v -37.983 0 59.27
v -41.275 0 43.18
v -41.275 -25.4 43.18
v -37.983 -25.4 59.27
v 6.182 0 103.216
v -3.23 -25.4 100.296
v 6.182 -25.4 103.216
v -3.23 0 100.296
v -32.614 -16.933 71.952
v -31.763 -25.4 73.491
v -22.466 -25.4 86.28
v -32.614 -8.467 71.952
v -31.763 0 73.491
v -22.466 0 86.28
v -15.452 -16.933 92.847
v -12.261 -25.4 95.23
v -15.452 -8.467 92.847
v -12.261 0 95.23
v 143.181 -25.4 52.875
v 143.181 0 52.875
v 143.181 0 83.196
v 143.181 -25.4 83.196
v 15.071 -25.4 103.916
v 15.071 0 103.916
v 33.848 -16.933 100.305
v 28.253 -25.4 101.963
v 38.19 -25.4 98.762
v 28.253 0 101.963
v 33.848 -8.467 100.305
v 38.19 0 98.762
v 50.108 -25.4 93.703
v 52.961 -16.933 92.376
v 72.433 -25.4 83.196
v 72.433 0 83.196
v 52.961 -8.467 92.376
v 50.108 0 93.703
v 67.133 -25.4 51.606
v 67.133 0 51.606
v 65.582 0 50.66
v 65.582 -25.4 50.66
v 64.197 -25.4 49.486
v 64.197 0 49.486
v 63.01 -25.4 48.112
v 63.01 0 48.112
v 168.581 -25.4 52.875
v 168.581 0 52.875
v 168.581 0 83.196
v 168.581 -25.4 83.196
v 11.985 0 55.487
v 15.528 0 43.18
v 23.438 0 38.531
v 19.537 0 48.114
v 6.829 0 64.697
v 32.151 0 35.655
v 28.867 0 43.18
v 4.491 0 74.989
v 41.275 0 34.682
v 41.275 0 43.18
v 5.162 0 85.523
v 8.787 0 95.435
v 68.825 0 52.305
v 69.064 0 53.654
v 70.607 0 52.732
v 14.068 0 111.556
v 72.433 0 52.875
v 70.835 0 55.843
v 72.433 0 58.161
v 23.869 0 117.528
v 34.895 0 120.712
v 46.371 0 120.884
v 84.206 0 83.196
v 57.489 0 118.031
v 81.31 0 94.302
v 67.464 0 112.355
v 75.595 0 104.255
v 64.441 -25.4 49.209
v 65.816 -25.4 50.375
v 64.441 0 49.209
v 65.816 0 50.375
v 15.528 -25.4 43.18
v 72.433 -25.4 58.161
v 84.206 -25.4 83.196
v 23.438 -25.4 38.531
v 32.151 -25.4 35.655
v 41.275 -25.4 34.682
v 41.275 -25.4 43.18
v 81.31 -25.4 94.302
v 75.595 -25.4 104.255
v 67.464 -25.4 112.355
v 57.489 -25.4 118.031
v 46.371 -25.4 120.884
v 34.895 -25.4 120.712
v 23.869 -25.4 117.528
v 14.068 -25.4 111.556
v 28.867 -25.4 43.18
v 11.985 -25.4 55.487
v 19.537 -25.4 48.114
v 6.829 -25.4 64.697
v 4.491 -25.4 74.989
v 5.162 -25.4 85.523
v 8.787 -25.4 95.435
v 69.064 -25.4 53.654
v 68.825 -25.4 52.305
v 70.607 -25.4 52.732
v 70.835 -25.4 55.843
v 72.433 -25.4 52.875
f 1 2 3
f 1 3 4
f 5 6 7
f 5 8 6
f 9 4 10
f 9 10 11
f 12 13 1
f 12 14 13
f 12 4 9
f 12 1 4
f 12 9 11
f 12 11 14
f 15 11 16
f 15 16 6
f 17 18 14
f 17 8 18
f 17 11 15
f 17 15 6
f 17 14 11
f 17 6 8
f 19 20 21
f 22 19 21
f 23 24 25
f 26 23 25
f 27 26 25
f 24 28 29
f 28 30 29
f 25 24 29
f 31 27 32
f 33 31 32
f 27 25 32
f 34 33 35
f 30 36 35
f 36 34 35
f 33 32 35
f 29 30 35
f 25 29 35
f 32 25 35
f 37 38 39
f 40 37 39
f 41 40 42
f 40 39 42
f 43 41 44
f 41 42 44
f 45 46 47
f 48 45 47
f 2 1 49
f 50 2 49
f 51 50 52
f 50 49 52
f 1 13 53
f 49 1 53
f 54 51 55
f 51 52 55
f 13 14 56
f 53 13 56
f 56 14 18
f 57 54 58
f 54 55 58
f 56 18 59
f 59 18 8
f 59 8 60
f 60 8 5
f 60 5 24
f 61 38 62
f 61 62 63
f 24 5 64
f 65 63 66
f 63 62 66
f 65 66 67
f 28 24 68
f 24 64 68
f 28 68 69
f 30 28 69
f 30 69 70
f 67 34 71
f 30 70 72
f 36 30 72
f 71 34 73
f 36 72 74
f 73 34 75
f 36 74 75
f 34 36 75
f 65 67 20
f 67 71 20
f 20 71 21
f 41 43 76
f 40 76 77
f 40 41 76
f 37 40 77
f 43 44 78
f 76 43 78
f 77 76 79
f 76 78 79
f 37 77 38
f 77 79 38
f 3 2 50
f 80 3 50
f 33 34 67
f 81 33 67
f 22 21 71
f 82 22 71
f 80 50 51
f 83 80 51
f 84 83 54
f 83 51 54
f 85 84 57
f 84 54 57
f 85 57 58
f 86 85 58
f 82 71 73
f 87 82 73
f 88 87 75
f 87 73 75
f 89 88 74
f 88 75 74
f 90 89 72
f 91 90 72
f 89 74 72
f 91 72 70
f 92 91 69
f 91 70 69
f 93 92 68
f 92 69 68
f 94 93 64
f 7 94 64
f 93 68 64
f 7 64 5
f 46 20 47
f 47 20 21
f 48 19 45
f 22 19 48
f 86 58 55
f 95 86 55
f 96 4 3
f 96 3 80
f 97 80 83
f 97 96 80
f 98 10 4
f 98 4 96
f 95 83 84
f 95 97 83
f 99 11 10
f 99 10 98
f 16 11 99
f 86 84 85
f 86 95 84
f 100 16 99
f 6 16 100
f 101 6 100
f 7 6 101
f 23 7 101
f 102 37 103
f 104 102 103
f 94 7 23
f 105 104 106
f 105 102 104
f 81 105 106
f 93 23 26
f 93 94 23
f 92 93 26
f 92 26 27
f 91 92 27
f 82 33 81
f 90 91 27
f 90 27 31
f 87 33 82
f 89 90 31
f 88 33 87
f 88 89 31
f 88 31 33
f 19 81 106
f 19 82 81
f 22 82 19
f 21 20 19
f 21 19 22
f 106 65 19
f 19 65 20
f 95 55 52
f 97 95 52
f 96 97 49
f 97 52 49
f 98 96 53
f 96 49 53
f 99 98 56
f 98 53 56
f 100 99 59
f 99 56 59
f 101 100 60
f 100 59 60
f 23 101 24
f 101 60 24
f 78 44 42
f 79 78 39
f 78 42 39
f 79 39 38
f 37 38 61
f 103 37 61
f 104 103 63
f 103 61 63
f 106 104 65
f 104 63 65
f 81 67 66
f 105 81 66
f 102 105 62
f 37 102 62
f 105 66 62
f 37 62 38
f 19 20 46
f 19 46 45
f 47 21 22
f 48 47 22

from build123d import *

# Parameters (mm, degrees)
F1_DEPTH = 25.4
F2_DEPTH = 25.4


with BuildPart() as f1:
    # F0 (on Front) → F1 (new body)
    with BuildSketch(Plane.XZ):
        with BuildLine():
            Line((72.4325664917, 52.87509395), (72.4325664917, 58.1607457576))
            ThreePointArc((72.4325664917, 58.1607457576), (69.9703403735, 54.7314871619), (67.1325553807, 51.6058914894))
            ThreePointArc((67.1325553807, 51.6058914894), (69.7076356365, 52.5533702418), (72.4325664917, 52.87509395))
        make_face()
        with BuildLine():
            ThreePointArc((28.867306155, 43.18), (34.9788331249, 41.5726006065), (41.275, 41.0315115251))
            Line((41.275, 41.0315115251), (41.275, 43.18))
            Line((41.275, 43.18), (28.867306155, 43.18))
        make_face()
        with BuildLine():
            Line((143.1810904025, 83.195894794), (84.2056303826, 83.195894794))
            ThreePointArc((84.2056303826, 83.195894794), (83.2038401711, 67.3172338588), (76.5285086007, 52.87509395))
            Line((76.5285086007, 52.87509395), (143.1810904025, 52.87509395))
            Line((143.1810904025, 52.87509395), (143.1810904025, 83.195894794))
        make_face()
        with BuildLine():
            add(Edge.make_bspline(
                [(-41.275, 43.18), (-38.2076507558, 75.0083079933), (-16.3456564999, 98.9918539738), (6.1822470816, 103.2164854954)],
                knots=[0, 0, 0, 0, 0.5125628883, 0.5125628883, 0.5125628883, 0.5125628883], degree=3))
            Line((-41.275, 43.18), (15.5276043564, 43.18))
            ThreePointArc((15.5276043564, 43.18), (-1.4622883665, 71.2809292123), (6.1822470816, 103.2164854954))
        make_face()
        with BuildLine():
            ThreePointArc((72.4325664917, 58.1607457576), (77.3570673495, 70.1979019154), (77.7998067643, 83.195894794))
            Line((77.7998067643, 83.195894794), (72.4325664917, 83.195894794))
            Line((72.4325664917, 83.195894794), (72.4325664917, 58.1607457576))
        make_face()
        with BuildLine():
            ThreePointArc((77.7998067643, 83.195894794), (52.8489424191, 112.9734263429), (15.0705554815, 103.9158054019))
            add(Edge.make_bspline(
                [(15.0705554815, 103.9158054019), (33.6888435037, 103.4873186987), (52.7725714881, 91.9791068), (72.4325664917, 83.195894794)],
                knots=[0.5797094346, 0.5797094346, 0.5797094346, 0.5797094346, 1, 1, 1, 1], degree=3))
            Line((72.4325664917, 83.195894794), (77.7998067643, 83.195894794))
        make_face()
        with BuildLine():
            ThreePointArc((15.5276043564, 43.18), (27.7181501223, 36.8610477658), (41.275, 34.6815100165))
            Line((41.275, 34.6815100165), (41.275, 41.0315115251))
            ThreePointArc((41.275, 41.0315115251), (34.9788331249, 41.5726006065), (28.867306155, 43.18))
            Line((28.867306155, 43.18), (15.5276043564, 43.18))
        make_face()
        with BuildLine():
            ThreePointArc((6.1822470816, 103.2164854954), (-1.4622883665, 71.2809292123), (15.5276043564, 43.18))
            Line((15.5276043564, 43.18), (28.867306155, 43.18))
            ThreePointArc((28.867306155, 43.18), (5.2898110786, 69.7590724553), (15.0705554815, 103.9158054019))
            add(Edge.make_bspline(
                [(6.1822470816, 103.2164854954), (9.1334379611, 103.769918884), (12.0960567855, 103.9842613813), (15.0705554815, 103.9158054019)],
                knots=[0.5125628883, 0.5125628883, 0.5125628883, 0.5125628883, 0.5797094346, 0.5797094346, 0.5797094346, 0.5797094346], degree=3))
        make_face()
        with BuildLine():
            ThreePointArc((84.2056303826, 83.195894794), (52.0250741297, 119.8281966308), (6.1822470816, 103.2164854954))
            add(Edge.make_bspline(
                [(6.1822470816, 103.2164854954), (9.1334379611, 103.769918884), (12.0960567855, 103.9842613813), (15.0705554815, 103.9158054019)],
                knots=[0.5125628883, 0.5125628883, 0.5125628883, 0.5125628883, 0.5797094346, 0.5797094346, 0.5797094346, 0.5797094346], degree=3))
            ThreePointArc((15.0705554815, 103.9158054019), (52.8489424191, 112.9734263429), (77.7998067643, 83.195894794))
            Line((77.7998067643, 83.195894794), (84.2056303826, 83.195894794))
        make_face()
        with BuildLine():
            ThreePointArc((76.5285086007, 52.87509395), (83.2038401711, 67.3172338588), (84.2056303826, 83.195894794))
            Line((84.2056303826, 83.195894794), (77.7998067643, 83.195894794))
            ThreePointArc((77.7998067643, 83.195894794), (77.3570673495, 70.1979019154), (72.4325664917, 58.1607457576))
            Line((72.4325664917, 58.1607457576), (72.4325664917, 52.87509395))
            Line((72.4325664917, 52.87509395), (76.5285086007, 52.87509395))
        make_face()
    extrude(amount=F1_DEPTH)


with BuildPart() as f1b:
    # F0 (on Front) → F1, piece 2 (new body)
    with BuildSketch(Plane.XZ):
        with BuildLine():
            ThreePointArc((63.0104089466, 48.1118913796), (65.1355233085, 49.7833370645), (67.1325553807, 51.6058914894))
            ThreePointArc((67.1325553807, 51.6058914894), (64.8670148478, 50.1001175909), (63.0104089466, 48.1118913796))
        make_face()
    extrude(amount=F1_DEPTH)


with BuildPart() as f2:
    # F2 (new): a face of the model
    f2_faces = [f1.part.faces().sort_by_distance(p)[0] for p in [
        (143.1810904025, -12.7, 68.035494372),
    ]]
    extrude(f2_faces, amount=F2_DEPTH)


solid = Compound([f1.part, f1b.part, f2.part])
